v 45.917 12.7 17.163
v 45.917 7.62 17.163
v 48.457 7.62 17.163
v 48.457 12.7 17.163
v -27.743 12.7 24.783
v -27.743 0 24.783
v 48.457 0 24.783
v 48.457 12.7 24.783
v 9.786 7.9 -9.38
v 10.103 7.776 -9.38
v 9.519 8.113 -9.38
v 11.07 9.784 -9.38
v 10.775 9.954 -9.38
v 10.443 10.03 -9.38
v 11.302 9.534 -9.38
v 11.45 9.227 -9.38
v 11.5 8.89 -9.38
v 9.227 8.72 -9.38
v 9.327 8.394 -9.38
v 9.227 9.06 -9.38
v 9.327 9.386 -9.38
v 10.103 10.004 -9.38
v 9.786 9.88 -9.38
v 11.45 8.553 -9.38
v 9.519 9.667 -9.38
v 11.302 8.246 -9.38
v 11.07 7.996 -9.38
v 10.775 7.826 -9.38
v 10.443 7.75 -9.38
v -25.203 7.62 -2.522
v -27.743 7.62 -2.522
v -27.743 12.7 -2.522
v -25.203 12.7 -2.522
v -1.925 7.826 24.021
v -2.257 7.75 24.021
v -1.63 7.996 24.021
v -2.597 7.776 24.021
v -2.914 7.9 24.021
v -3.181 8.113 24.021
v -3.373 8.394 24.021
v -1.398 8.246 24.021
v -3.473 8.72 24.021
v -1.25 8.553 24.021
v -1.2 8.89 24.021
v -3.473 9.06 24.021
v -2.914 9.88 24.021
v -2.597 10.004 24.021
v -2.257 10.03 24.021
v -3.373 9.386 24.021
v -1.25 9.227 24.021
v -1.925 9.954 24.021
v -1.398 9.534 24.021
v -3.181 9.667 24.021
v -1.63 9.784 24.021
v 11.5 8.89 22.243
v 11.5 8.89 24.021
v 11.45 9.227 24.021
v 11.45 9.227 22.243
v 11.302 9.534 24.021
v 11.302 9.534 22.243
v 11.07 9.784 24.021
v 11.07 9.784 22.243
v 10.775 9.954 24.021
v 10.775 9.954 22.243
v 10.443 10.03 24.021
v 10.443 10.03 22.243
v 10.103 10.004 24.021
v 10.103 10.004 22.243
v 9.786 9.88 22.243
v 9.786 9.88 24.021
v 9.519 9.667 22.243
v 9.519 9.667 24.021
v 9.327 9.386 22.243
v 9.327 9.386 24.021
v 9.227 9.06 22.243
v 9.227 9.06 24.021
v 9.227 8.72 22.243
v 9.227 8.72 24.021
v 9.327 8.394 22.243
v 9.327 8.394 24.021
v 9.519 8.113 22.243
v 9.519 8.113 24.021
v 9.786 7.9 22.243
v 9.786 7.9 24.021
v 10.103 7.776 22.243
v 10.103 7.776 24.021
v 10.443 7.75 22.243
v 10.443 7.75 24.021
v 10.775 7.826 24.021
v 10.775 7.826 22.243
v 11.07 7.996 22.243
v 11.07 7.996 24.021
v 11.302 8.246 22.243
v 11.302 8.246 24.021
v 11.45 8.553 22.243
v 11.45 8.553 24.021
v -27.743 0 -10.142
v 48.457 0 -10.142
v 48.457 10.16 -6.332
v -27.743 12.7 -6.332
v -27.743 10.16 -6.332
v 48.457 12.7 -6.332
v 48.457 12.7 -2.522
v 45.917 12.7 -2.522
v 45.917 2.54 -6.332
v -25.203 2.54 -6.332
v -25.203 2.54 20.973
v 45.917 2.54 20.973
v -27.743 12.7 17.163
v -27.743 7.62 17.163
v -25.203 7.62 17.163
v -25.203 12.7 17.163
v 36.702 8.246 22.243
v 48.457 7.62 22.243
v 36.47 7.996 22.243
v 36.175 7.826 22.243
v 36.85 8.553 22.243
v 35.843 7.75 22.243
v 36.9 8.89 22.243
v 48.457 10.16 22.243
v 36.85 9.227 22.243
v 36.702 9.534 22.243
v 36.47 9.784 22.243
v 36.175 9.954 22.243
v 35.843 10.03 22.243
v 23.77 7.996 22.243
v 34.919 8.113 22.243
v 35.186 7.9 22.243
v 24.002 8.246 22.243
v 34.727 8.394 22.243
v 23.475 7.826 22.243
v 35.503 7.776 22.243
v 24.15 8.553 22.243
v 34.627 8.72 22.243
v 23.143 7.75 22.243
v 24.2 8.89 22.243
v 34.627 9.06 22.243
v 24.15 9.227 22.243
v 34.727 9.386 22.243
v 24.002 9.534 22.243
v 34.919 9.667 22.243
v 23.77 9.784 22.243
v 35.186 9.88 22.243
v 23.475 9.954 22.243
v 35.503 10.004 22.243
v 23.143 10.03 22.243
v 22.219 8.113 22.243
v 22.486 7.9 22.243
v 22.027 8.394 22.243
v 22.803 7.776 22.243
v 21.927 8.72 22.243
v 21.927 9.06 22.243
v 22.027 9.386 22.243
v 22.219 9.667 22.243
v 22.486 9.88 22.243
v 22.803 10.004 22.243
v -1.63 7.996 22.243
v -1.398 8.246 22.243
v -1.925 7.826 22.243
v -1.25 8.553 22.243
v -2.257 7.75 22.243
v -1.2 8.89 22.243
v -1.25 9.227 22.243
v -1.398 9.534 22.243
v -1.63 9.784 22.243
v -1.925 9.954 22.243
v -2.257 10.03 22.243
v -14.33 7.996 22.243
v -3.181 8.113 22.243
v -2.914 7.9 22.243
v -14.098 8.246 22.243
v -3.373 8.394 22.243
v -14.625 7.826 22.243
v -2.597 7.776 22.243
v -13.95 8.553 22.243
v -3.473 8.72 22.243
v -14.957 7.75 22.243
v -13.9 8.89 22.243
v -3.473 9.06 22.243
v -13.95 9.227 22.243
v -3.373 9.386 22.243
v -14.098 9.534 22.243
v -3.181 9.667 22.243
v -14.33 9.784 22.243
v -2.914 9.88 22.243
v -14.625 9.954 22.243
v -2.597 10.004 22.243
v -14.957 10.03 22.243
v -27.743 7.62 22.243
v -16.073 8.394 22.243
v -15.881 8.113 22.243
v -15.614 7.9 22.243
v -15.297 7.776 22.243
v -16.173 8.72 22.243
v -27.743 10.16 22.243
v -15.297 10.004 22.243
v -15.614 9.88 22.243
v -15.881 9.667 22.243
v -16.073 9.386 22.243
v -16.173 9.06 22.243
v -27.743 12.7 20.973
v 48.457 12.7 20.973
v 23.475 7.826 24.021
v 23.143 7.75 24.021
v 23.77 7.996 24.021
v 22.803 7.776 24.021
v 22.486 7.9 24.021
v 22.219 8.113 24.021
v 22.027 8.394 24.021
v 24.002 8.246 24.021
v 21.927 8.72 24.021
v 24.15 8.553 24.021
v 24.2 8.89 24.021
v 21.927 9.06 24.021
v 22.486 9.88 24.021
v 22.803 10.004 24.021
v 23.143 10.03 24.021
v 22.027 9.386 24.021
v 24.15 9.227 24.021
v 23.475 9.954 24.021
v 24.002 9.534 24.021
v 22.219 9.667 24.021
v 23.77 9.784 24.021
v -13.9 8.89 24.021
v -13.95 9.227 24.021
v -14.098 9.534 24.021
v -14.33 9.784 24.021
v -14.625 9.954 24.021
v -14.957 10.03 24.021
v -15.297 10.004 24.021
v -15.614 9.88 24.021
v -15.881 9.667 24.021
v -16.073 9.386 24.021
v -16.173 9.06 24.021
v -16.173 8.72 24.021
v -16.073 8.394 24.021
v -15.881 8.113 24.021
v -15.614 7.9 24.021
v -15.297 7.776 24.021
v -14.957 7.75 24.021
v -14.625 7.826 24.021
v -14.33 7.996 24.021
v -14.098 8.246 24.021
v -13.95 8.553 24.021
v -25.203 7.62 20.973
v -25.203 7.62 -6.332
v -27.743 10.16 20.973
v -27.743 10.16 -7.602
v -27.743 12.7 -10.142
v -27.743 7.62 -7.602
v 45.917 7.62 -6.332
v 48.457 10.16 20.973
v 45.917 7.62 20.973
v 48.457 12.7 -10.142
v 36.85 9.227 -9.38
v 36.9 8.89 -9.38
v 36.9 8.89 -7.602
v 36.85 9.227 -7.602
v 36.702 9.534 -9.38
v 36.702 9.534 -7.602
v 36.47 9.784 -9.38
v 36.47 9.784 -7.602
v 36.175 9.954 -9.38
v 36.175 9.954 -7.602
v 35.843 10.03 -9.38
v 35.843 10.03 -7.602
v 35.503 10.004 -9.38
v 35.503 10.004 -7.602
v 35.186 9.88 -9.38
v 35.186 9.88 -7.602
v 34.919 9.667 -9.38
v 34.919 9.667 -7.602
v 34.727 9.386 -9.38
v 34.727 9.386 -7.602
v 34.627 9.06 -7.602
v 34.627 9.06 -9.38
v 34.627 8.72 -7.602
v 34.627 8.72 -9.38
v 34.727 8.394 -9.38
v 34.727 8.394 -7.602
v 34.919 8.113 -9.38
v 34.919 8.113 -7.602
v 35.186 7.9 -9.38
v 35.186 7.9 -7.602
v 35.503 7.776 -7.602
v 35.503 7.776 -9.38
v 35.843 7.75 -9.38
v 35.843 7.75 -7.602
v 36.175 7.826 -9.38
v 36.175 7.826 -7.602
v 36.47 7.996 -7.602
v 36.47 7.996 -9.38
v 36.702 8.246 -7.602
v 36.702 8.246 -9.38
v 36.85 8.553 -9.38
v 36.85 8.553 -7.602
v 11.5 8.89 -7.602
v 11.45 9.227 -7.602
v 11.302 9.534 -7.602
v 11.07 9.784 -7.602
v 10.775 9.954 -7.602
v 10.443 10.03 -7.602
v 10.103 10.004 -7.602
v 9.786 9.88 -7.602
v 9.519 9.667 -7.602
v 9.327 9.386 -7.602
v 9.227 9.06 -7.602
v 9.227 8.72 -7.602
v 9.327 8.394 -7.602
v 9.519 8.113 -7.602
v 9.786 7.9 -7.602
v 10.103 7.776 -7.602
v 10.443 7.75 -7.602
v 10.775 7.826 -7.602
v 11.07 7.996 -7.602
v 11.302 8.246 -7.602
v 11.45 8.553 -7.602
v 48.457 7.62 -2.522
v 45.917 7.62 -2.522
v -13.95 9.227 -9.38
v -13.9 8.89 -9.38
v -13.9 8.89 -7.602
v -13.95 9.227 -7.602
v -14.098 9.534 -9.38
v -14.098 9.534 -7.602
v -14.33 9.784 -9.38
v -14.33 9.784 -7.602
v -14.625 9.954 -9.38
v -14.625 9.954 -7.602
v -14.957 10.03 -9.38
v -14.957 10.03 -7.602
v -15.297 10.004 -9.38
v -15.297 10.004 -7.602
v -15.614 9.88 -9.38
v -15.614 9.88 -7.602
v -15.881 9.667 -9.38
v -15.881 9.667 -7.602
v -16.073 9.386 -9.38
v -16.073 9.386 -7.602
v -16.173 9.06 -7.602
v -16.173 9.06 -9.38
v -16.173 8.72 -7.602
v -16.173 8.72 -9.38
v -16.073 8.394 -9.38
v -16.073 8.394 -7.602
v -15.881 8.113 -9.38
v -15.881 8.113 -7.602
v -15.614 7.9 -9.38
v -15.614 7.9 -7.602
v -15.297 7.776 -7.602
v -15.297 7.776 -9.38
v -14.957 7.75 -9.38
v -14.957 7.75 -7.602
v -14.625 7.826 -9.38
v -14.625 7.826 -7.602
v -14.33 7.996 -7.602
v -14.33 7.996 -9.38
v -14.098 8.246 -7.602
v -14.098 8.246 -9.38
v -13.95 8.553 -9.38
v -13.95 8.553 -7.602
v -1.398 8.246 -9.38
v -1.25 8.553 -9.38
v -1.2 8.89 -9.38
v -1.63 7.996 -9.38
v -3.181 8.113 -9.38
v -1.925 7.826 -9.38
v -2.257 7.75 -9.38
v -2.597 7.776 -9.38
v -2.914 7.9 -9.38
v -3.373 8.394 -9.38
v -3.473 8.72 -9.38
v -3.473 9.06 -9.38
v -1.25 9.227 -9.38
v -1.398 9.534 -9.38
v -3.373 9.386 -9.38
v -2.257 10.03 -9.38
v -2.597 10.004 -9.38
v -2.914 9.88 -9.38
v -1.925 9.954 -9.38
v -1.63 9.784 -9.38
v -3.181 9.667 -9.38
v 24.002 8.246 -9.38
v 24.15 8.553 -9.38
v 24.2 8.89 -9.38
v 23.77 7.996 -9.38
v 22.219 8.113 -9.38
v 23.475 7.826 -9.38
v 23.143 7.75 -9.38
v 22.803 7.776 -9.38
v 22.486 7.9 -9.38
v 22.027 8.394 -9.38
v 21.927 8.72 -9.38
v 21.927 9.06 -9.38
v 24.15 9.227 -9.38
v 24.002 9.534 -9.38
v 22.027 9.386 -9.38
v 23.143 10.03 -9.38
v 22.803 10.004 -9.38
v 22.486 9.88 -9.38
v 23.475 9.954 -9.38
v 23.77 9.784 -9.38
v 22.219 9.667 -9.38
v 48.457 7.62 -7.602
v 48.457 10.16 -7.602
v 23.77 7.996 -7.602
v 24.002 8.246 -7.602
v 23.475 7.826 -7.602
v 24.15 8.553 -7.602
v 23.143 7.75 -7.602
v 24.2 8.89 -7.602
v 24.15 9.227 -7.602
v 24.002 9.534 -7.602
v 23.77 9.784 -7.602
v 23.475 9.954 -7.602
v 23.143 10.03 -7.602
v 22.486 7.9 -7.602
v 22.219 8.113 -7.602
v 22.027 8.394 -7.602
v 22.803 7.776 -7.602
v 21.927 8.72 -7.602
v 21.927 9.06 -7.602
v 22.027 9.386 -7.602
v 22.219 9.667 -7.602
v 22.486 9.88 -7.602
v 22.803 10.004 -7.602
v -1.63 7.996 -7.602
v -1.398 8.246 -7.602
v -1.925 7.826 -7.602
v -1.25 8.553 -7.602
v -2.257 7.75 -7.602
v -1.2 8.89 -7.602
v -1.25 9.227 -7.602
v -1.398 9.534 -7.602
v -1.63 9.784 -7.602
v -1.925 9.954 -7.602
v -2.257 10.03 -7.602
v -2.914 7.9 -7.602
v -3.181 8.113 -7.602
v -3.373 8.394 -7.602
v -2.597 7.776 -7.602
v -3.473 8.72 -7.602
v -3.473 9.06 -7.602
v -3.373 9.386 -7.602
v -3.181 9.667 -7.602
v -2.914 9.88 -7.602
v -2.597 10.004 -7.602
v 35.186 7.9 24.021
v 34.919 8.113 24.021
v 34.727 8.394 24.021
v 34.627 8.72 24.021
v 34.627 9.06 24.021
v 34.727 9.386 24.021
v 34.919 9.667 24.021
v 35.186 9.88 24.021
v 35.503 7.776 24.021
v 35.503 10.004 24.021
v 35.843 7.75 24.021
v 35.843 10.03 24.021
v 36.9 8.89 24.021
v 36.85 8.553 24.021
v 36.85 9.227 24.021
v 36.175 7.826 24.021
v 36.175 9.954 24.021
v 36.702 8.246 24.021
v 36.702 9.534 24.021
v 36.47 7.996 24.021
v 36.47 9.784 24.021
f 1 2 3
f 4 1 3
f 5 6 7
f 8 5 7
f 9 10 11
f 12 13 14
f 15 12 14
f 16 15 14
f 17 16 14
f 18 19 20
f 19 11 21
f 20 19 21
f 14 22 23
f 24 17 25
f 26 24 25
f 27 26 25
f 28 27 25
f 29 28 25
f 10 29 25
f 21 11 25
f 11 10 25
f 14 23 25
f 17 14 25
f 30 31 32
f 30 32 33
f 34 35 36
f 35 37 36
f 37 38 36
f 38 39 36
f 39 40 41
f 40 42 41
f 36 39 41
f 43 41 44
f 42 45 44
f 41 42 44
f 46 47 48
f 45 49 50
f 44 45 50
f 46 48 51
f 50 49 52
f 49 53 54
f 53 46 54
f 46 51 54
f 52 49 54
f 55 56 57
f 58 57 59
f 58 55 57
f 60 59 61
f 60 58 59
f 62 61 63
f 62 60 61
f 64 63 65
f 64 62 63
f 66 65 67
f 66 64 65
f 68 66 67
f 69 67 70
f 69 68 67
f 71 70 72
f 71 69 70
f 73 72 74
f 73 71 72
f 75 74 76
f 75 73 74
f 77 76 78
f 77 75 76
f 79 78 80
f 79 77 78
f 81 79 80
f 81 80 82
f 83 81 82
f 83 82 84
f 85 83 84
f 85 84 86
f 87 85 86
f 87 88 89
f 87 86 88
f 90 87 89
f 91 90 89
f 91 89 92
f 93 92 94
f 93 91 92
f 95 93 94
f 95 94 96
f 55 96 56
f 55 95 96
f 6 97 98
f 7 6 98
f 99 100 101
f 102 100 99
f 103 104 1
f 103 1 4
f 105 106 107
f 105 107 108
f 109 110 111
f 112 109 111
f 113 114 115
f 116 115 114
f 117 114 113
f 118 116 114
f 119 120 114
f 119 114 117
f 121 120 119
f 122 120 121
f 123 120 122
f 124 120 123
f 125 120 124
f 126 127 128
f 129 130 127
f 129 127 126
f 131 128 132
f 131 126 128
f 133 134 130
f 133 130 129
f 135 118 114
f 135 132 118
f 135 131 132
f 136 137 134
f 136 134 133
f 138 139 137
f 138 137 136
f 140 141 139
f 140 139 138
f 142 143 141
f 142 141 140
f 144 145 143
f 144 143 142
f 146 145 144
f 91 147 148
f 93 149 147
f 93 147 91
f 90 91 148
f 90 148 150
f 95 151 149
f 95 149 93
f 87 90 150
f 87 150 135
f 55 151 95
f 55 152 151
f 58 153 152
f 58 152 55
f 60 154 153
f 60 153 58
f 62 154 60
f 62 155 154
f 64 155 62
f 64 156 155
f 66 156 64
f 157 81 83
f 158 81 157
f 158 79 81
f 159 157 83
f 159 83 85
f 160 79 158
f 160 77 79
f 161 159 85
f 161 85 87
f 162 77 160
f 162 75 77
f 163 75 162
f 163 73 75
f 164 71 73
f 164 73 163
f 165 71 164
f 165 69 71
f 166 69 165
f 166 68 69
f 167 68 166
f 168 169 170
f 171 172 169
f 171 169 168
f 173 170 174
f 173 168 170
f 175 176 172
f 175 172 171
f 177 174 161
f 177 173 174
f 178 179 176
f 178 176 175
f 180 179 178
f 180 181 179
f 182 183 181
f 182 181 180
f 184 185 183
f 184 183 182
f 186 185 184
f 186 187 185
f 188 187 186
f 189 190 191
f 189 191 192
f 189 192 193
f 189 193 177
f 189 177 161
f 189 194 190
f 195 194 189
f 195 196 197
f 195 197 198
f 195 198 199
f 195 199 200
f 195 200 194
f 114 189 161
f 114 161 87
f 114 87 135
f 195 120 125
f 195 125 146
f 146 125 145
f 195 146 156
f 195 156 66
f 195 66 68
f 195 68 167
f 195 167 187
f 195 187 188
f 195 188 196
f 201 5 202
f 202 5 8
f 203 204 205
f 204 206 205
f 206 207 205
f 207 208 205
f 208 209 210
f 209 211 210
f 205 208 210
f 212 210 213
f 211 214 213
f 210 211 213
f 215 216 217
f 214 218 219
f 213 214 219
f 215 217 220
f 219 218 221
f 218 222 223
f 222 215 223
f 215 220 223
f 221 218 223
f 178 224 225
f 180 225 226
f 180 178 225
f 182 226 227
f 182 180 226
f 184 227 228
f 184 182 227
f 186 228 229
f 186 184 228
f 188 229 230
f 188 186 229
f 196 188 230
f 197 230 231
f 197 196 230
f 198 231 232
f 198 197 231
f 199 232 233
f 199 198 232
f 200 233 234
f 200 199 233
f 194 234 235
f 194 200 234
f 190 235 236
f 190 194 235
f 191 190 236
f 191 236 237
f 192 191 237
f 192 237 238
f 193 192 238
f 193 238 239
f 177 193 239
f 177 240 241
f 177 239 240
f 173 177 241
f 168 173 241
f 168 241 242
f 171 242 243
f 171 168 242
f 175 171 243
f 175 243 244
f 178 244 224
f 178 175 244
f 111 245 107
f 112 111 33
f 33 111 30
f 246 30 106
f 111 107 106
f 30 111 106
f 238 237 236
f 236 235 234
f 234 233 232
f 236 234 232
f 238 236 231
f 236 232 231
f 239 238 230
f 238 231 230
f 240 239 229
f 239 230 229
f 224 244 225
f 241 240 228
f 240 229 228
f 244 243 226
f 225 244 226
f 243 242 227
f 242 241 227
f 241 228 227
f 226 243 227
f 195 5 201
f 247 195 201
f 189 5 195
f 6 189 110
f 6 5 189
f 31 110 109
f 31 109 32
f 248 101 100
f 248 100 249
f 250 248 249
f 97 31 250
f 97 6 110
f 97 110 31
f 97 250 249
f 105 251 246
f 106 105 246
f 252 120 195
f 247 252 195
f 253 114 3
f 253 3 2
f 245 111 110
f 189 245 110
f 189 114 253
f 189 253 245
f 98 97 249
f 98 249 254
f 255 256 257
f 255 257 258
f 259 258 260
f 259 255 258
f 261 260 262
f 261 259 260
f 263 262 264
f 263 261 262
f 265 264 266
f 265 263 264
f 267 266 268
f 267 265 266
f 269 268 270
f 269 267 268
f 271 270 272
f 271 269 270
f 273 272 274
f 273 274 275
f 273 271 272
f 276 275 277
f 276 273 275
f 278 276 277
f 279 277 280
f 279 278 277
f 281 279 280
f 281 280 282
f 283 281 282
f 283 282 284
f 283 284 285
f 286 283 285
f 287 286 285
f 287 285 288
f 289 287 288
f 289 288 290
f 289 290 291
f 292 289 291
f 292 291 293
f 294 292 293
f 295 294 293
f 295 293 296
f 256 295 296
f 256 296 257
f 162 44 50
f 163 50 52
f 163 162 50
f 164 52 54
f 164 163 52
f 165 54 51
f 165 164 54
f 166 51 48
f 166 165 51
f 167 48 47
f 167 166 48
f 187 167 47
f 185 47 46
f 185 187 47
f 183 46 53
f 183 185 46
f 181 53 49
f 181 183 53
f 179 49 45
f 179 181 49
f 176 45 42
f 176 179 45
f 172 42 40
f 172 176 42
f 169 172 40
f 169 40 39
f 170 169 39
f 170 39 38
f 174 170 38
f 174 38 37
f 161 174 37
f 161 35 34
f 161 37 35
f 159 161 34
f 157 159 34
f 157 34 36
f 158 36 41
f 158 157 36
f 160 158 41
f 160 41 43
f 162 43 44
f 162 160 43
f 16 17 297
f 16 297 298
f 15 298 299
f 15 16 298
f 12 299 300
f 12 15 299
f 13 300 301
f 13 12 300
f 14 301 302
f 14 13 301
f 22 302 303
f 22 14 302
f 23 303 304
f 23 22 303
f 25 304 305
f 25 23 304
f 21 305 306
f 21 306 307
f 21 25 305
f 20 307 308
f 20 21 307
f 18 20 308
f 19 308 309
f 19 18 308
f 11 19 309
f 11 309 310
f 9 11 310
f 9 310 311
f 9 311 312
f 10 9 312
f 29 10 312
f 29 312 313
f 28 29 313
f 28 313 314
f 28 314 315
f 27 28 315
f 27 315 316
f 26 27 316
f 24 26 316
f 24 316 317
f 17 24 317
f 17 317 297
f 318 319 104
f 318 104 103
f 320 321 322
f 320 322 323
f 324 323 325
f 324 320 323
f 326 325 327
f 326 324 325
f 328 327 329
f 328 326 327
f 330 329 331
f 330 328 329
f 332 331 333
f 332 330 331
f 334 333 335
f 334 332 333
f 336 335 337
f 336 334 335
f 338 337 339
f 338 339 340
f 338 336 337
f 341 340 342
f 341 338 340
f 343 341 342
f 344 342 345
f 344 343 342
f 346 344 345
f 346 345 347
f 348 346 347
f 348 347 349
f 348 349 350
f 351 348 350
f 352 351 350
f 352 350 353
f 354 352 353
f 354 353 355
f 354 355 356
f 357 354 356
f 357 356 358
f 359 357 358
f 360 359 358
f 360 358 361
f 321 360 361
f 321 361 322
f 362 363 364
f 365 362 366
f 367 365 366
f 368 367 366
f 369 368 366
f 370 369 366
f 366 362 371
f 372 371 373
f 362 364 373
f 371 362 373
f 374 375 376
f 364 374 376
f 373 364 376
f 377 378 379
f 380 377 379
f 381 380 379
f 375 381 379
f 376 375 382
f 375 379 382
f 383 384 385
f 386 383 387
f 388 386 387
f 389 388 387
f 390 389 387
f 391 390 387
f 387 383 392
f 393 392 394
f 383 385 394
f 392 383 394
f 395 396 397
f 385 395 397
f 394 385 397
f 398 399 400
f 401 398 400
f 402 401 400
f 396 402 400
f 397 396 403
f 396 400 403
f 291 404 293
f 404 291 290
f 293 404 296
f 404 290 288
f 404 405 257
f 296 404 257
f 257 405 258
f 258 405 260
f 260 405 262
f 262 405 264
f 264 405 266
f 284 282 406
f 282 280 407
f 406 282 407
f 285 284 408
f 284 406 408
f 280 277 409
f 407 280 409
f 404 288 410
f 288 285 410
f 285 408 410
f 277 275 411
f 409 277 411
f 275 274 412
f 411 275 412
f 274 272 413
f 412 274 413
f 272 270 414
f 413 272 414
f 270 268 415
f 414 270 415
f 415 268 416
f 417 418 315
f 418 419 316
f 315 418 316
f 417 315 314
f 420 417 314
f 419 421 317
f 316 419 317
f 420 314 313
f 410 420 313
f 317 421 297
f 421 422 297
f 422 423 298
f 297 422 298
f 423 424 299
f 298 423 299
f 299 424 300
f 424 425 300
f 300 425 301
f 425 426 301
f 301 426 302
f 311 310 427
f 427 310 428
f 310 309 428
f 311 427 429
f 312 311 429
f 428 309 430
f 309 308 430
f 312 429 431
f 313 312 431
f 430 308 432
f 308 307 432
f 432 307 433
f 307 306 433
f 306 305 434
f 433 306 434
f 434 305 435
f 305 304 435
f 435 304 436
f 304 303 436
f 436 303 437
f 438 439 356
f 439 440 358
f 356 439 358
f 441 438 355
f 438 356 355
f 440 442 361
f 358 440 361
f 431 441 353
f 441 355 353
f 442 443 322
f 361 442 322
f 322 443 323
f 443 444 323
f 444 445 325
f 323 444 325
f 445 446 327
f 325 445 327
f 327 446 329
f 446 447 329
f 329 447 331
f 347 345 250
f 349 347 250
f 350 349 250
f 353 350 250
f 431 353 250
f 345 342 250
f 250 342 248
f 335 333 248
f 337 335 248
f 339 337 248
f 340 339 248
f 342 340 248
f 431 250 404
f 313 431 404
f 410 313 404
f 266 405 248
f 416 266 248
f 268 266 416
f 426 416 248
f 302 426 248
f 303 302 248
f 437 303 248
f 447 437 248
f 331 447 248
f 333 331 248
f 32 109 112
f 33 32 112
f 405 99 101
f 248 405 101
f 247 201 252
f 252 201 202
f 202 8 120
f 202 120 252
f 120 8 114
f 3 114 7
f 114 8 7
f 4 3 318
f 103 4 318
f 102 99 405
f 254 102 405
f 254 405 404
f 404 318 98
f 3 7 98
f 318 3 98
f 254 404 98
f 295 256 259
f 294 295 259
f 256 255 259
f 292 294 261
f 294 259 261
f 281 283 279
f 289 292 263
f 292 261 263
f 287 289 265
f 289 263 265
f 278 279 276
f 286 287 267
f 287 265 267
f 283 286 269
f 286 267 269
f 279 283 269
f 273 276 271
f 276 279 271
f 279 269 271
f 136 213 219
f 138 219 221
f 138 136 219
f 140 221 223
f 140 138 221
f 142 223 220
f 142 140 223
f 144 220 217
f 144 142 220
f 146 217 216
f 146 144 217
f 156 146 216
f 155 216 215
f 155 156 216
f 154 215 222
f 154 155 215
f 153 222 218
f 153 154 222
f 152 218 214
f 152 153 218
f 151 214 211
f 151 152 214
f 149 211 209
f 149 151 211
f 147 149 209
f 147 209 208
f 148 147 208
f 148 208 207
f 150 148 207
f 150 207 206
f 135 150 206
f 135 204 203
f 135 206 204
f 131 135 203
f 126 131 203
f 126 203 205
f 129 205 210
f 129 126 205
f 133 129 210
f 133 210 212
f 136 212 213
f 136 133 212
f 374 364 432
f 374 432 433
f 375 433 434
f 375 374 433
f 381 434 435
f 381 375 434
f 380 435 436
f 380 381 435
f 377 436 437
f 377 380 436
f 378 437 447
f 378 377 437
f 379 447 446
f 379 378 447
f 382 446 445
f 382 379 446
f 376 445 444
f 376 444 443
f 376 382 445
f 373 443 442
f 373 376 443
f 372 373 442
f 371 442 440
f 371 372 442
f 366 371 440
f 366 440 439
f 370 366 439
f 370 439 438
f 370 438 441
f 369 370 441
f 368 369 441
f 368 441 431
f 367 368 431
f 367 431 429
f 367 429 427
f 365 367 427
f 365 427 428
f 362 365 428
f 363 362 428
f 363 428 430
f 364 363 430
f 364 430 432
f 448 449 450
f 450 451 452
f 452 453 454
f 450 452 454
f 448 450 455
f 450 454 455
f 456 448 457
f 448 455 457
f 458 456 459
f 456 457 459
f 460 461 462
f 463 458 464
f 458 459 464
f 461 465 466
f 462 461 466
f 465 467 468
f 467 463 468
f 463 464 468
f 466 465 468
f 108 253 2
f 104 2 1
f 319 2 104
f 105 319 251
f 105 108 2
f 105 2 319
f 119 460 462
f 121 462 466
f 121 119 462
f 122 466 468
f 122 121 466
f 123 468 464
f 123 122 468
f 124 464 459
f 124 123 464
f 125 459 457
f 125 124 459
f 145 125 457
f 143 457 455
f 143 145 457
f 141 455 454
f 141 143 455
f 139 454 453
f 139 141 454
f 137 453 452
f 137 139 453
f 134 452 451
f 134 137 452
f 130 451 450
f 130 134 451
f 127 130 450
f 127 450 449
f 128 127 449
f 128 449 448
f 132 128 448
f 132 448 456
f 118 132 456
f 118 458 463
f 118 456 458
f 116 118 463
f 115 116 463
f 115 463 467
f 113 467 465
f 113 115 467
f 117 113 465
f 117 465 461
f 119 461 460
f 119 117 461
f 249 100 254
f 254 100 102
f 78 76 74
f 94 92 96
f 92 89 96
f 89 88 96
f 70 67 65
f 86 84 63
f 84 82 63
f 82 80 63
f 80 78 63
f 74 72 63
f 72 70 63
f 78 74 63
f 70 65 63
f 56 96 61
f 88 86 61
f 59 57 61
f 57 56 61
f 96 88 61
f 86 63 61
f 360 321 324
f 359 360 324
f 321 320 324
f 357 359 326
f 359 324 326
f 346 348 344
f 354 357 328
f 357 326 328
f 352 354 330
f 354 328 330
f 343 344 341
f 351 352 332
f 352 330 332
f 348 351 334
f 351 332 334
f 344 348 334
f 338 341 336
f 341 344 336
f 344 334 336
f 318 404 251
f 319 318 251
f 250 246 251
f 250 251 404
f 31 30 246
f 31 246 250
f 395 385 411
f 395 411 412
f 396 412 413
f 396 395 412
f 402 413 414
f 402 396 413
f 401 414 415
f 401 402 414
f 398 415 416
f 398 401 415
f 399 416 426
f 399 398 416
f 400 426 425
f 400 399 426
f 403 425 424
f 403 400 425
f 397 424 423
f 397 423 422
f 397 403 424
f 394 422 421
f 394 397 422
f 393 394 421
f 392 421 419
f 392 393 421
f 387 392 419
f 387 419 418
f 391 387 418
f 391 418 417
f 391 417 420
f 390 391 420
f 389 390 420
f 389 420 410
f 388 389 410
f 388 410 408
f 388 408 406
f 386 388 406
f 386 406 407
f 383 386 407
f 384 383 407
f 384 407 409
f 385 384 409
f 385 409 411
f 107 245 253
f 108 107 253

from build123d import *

# Parameters (mm, degrees)
SKETCH1_W                 = 76.2
SKETCH1_H                 = 34.925
BOSS_EXTRUDE1_DEPTH       = 12.7
SHELL1_T                  = -2.54
SHELL1_THICKNESS_2_FACE_W = 71.12
SHELL1_THICKNESS_2_FACE_H = 10.16
SHELL1_THICKNESS_2_DEPTH  = 1.27
SHELL1_THICKNESS_3_FACE_W = 71.12
SHELL1_THICKNESS_3_FACE_H = 10.16
SHELL1_THICKNESS_3_DEPTH  = 1.27
CUT_EXTRUDE4_DEPTH        = 28.575
CUT_EXTRUDE4_DEPTH_BACK   = 1.27
SKETCH10_W                = 76.2
SKETCH10_H                = 2.54
SKETCH11_W                = 2.54
SKETCH11_H                = 27.305
CUT_EXTRUDE5_DEPTH        = 2.54
FILL_START                = -10.141504854
FILL_PATTERN1_OUTLINE_R   = 1.143
FILL_PATTERN1_DEPTH       = 2.54
FILL_START_2              = 22.243495146
FILL_PATTERN2_OUTLINE_R   = 1.143
FILL_PATTERN2_DEPTH       = 2.54
SKETCH14_W                = 63.5
SKETCH14_H                = 5.08
BOSS_EXTRUDE2_DEPTH       = 0.762
SKETCH15_W                = 63.5
SKETCH15_H                = 5.08
BOSS_EXTRUDE3_DEPTH       = 0.762
SKETCH17_W                = 2.54
SKETCH17_H                = 19.685
BOSS_EXTRUDE4_DEPTH       = 5.08


# Read off the part's stored shape, not the designer's step: Fill Pattern1, Fill Pattern2
with BuildPart() as part:
    # Sketch1 → Boss-Extrude1 (new body)
    with BuildSketch(Plane(origin=(0, 0, 0), x_dir=(1, 0, 0), z_dir=(0, 1, 0))):
        with Locations((10.357281553, -7.320995146)):
            Rectangle(SKETCH1_W, SKETCH1_H)
    extrude(amount=BOSS_EXTRUDE1_DEPTH)

    # Shell1
    shell1_openings = [part.faces().sort_by_distance(p)[0] for p in [
        (10.357281553, 12.7, 7.320995146),
    ]]
    offset(amount=SHELL1_T, openings=shell1_openings, kind=Kind.INTERSECTION)

    # Shell1 thickness 2 face (on inner face of the shell) → Shell1 thickness 2 (add)
    with BuildSketch(Plane(origin=(10.357281553, 7.62, -7.601504854), x_dir=(-1, 0, 0), z_dir=(0, 0, -1))):
        Rectangle(SHELL1_THICKNESS_2_FACE_W, SHELL1_THICKNESS_2_FACE_H)
    extrude(amount=-SHELL1_THICKNESS_2_DEPTH)

    # Shell1 thickness 3 face (on inner face of the shell) → Shell1 thickness 3 (add)
    with BuildSketch(Plane(origin=(10.357281553, 7.62, 22.243495146), x_dir=(1, 0, 0), z_dir=(0, 0, 1))):
        Rectangle(SHELL1_THICKNESS_3_FACE_W, SHELL1_THICKNESS_3_FACE_H)
    extrude(amount=-SHELL1_THICKNESS_3_DEPTH)

    # Sketch10 → Cut-Extrude4 (cut, two sides: drawn at the far end of the back side and taken through both)
    with BuildSketch(Plane(origin=(0, 0, 20.973495146), x_dir=(-1, 0, 0), z_dir=(0, 0, -1)).offset(-CUT_EXTRUDE4_DEPTH_BACK)):
        with Locations((-10.357281553, 8.89)):
            Rectangle(SKETCH10_W, SKETCH10_H)
    extrude(amount=CUT_EXTRUDE4_DEPTH + CUT_EXTRUDE4_DEPTH_BACK, mode=Mode.SUBTRACT)

    # Sketch11 → Cut-Extrude5 (cut)
    with BuildSketch(Plane(origin=(0, 12.7, 0), x_dir=(1, 0, 0), z_dir=(0, 1, 0))):
        with Locations((-26.472718447, -7.320995146)):
            Rectangle(SKETCH11_W, SKETCH11_H)
        with Locations((47.187281553, -7.320995146)):
            Rectangle(SKETCH11_W, SKETCH11_H)
    extrude(amount=-CUT_EXTRUDE5_DEPTH, mode=Mode.SUBTRACT)

    # Fill Pattern1 outline → Fill Pattern1 (cut)
    with BuildSketch(Plane.XY.offset(FILL_START)):
        with Locations((10.357281553, 8.89)):
            Circle(FILL_PATTERN1_OUTLINE_R)
        with Locations((23.057281553, 8.89)):
            Circle(FILL_PATTERN1_OUTLINE_R)
        with Locations((35.757281553, 8.89)):
            Circle(FILL_PATTERN1_OUTLINE_R)
        with Locations((-2.342718447, 8.89)):
            Circle(FILL_PATTERN1_OUTLINE_R)
        with Locations((-15.042718447, 8.89)):
            Circle(FILL_PATTERN1_OUTLINE_R)
    extrude(amount=FILL_PATTERN1_DEPTH, mode=Mode.SUBTRACT)

    # Fill Pattern2 outline → Fill Pattern2 (cut)
    with BuildSketch(Plane.XY.offset(FILL_START_2)):
        with Locations((10.357281553, 8.89)):
            Circle(FILL_PATTERN2_OUTLINE_R)
        with Locations((23.057281553, 8.89)):
            Circle(FILL_PATTERN2_OUTLINE_R)
        with Locations((35.757281553, 8.89)):
            Circle(FILL_PATTERN2_OUTLINE_R)
        with Locations((-2.342718447, 8.89)):
            Circle(FILL_PATTERN2_OUTLINE_R)
        with Locations((-15.042718447, 8.89)):
            Circle(FILL_PATTERN2_OUTLINE_R)
    extrude(amount=FILL_PATTERN2_DEPTH, mode=Mode.SUBTRACT)

    # Sketch14 → Boss-Extrude2 (add)
    with BuildSketch(Plane.XY.offset(24.783495146)):
        with Locations((10.357281553, 8.89)):
            Rectangle(SKETCH14_W, SKETCH14_H)
    extrude(amount=-BOSS_EXTRUDE2_DEPTH)

    # Sketch15 → Boss-Extrude3 (add)
    with BuildSketch(Plane(origin=(0, 0, -10.141504854), x_dir=(-1, 0, 0), z_dir=(0, 0, -1))):
        with Locations((-10.357281553, 8.89)):
            Rectangle(SKETCH15_W, SKETCH15_H)
    extrude(amount=-BOSS_EXTRUDE3_DEPTH)

    # Sketch17 → Boss-Extrude4 (add)
    with BuildSketch(Plane(origin=(0, 7.62, 0), x_dir=(1, 0, 0), z_dir=(0, 1, 0))):
        with Locations((-26.472718447, -7.320995146)):
            Rectangle(SKETCH17_W, SKETCH17_H)
        with Locations((47.187281553, -7.320995146)):
            Rectangle(SKETCH17_W, SKETCH17_H)
    extrude(amount=BOSS_EXTRUDE4_DEPTH)


solid = part.part
